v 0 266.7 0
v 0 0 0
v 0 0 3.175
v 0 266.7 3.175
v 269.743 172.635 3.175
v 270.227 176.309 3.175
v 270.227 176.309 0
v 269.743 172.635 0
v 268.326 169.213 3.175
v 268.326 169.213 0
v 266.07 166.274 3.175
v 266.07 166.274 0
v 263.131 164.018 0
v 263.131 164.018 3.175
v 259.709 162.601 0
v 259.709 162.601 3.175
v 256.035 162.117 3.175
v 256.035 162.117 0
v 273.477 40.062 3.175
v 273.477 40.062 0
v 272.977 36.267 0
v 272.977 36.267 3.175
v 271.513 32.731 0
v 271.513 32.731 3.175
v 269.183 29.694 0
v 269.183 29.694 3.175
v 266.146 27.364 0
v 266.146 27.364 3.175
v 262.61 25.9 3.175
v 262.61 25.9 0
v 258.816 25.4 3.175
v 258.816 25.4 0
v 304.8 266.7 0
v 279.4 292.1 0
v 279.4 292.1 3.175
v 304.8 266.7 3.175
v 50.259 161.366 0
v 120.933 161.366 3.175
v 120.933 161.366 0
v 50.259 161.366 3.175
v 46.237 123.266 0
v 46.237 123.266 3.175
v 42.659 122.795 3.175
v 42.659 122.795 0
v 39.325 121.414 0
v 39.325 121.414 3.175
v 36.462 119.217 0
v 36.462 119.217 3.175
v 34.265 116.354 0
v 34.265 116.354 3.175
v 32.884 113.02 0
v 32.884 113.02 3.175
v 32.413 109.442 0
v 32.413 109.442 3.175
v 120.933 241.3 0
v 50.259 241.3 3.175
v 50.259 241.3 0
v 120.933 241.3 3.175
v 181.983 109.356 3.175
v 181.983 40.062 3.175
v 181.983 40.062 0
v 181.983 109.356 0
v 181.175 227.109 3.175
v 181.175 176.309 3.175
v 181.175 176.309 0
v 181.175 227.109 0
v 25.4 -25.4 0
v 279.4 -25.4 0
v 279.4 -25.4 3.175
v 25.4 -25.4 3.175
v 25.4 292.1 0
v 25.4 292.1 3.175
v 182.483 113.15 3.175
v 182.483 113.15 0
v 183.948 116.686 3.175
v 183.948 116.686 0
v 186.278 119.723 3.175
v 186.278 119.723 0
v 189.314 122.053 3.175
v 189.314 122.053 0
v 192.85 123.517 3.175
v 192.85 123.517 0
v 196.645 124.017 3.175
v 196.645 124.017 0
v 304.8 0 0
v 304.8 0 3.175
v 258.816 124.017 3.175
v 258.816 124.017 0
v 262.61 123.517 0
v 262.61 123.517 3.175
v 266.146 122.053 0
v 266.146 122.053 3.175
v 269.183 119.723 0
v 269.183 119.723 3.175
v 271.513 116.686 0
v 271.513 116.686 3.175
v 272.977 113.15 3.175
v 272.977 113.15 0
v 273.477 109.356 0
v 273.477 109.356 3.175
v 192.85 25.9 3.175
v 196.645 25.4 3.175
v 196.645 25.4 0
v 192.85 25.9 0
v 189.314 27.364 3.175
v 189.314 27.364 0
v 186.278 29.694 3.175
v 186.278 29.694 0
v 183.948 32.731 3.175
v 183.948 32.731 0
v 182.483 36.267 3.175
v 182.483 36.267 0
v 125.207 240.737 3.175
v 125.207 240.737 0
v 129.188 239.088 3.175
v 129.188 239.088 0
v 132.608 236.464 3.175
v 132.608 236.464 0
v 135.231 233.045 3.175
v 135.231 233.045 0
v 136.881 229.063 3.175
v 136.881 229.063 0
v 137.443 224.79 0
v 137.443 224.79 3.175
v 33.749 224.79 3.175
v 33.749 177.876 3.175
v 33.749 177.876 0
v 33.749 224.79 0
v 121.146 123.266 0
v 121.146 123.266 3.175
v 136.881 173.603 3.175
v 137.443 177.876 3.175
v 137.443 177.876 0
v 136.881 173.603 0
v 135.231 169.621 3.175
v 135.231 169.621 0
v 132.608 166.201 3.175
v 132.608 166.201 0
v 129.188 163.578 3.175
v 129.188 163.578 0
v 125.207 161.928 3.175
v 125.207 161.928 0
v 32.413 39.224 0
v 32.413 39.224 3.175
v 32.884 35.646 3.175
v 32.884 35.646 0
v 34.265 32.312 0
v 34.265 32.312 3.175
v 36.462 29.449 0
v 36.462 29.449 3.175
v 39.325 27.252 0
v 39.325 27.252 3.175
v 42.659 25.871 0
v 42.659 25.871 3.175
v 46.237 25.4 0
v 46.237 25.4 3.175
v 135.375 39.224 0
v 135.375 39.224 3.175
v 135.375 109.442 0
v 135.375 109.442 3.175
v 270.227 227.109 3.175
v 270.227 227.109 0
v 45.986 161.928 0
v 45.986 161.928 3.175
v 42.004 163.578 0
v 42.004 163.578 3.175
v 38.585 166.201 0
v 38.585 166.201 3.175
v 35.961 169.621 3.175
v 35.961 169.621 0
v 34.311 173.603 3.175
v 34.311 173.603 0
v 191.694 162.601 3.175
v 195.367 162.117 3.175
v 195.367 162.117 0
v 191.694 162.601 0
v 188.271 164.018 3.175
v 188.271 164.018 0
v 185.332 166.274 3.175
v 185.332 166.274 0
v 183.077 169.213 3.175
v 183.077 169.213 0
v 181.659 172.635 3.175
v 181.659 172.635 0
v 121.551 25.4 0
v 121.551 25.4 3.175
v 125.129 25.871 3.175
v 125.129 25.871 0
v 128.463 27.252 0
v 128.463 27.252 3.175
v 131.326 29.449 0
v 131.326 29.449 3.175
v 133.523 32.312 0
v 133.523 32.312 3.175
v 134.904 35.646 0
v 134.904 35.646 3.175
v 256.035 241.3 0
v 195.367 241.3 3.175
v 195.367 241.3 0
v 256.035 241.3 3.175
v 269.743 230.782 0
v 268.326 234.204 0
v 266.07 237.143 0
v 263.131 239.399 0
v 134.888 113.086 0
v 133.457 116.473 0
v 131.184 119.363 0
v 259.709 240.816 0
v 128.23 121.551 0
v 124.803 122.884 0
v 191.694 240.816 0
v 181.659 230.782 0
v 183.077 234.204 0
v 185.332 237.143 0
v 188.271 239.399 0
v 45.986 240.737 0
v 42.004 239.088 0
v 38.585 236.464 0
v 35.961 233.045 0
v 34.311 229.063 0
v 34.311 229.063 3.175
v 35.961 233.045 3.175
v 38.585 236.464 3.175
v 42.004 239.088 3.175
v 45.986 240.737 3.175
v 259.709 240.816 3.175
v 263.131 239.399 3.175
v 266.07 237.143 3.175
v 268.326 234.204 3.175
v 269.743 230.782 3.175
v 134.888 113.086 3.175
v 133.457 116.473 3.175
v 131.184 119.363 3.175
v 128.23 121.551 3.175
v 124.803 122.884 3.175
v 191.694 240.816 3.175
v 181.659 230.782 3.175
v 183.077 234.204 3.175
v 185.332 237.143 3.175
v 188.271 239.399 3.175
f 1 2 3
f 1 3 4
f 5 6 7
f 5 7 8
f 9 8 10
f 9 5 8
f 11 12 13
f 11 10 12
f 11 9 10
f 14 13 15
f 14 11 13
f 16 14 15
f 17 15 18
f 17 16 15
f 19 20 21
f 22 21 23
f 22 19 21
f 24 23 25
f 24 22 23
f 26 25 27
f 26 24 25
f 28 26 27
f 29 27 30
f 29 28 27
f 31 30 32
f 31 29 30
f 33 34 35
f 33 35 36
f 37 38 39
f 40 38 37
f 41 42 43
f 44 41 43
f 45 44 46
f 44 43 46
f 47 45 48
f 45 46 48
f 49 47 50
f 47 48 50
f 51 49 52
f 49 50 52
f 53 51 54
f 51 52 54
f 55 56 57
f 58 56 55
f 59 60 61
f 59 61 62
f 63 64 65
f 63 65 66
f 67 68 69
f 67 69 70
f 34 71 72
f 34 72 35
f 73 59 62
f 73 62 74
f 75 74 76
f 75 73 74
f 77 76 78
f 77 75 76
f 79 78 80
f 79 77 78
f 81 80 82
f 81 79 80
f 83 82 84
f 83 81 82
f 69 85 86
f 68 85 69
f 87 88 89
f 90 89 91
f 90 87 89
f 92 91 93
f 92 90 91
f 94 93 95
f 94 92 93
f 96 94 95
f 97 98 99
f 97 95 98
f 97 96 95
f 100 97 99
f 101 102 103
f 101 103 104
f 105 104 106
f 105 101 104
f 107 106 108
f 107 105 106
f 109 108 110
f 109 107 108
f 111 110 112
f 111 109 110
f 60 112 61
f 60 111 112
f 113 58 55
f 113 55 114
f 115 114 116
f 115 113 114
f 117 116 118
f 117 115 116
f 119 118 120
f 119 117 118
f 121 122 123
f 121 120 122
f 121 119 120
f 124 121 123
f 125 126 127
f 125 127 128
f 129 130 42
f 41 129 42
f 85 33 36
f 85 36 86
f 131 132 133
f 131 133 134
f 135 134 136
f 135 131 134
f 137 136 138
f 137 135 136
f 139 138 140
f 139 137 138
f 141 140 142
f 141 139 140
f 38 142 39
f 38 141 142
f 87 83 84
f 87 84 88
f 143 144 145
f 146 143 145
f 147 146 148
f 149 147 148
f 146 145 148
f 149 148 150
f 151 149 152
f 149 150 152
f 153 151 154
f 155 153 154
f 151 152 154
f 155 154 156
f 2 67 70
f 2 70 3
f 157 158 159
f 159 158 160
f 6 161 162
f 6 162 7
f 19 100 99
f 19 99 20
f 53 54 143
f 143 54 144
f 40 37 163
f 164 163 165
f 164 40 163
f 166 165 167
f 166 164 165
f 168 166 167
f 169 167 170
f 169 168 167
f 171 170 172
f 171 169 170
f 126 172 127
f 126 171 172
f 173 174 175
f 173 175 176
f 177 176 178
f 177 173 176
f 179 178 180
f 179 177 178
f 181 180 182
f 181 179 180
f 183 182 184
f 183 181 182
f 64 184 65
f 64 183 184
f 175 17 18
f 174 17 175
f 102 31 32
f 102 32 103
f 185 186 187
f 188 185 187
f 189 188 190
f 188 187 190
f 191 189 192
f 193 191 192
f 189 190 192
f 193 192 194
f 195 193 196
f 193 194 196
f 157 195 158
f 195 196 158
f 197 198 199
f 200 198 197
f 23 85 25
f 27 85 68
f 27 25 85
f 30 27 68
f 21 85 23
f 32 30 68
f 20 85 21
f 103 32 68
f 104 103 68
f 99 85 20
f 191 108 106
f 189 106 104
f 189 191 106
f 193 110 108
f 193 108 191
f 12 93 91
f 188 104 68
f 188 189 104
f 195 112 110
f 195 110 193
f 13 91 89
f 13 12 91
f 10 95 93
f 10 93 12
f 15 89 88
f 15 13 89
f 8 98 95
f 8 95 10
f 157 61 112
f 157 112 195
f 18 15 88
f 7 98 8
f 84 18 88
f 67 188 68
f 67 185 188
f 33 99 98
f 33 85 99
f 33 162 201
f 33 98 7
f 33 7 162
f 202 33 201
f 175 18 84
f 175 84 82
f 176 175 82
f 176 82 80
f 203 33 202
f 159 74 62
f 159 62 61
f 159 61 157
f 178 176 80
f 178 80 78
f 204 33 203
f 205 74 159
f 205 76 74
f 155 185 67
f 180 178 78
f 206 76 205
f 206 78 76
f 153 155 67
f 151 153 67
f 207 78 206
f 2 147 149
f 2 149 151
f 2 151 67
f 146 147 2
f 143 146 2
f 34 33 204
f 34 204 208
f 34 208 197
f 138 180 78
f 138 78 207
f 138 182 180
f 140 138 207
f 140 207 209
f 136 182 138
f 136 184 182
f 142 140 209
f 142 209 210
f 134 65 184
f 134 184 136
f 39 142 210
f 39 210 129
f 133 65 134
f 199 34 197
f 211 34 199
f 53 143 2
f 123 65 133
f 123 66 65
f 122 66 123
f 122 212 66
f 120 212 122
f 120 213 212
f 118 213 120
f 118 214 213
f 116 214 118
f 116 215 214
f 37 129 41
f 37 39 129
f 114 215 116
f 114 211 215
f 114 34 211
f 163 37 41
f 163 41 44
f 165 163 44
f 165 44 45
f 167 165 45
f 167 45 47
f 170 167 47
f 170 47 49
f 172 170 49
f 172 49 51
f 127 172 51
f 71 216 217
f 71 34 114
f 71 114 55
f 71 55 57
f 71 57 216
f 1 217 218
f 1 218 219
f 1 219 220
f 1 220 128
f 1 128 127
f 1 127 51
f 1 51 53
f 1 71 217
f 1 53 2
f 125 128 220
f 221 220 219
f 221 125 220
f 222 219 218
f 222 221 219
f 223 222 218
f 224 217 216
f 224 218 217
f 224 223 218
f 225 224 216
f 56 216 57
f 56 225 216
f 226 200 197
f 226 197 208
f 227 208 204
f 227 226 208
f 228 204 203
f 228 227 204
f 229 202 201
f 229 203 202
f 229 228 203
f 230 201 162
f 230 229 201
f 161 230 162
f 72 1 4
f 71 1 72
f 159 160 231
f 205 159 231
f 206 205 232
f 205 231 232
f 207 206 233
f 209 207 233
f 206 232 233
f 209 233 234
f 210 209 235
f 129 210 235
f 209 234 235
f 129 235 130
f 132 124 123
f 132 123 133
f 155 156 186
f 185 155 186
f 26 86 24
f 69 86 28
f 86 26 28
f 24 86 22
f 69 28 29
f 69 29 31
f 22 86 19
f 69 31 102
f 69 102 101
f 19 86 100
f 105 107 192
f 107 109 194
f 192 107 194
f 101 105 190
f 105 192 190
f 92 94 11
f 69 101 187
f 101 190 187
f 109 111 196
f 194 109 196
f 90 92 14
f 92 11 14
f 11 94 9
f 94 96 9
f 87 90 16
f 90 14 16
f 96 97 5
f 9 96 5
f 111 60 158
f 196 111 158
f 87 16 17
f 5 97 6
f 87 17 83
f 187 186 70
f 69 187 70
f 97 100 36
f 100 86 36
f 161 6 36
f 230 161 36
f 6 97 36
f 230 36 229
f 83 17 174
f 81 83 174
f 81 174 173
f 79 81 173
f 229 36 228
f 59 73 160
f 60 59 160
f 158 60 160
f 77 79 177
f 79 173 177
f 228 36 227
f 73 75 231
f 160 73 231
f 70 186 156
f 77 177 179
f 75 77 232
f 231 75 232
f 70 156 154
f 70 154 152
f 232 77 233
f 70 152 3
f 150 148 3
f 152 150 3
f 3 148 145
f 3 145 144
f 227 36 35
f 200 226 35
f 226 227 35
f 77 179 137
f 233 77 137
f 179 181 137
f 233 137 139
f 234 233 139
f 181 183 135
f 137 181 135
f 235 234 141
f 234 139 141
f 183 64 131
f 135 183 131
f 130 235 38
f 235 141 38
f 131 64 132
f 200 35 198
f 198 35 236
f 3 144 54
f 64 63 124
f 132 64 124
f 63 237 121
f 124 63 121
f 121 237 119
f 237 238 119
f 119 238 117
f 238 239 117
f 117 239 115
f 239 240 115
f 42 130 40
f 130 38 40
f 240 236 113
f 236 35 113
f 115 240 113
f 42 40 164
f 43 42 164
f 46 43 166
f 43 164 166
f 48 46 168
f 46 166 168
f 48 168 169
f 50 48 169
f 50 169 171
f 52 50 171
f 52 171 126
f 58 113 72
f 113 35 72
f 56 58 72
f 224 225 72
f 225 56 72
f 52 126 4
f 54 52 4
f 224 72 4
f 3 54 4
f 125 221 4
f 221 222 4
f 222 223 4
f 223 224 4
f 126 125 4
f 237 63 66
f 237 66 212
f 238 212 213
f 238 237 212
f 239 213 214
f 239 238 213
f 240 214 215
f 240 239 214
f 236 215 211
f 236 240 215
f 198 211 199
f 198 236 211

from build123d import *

# Parameters (mm, degrees)
BOSS_EXTRUDE1_DEPTH = 3.175
CUT_EXTRUDE7_DEPTH  = 127


with BuildPart() as part:
    # Sketch1 → Boss-Extrude1 (new body)
    with BuildSketch(Plane.XY):
        Polygon((0, 266.7), (25.4, 292.1), (279.4, 292.1), (304.8, 266.7), (304.8, 0), (279.4, -25.4), (25.4, -25.4), (0, 0), align=None)
    extrude(amount=BOSS_EXTRUDE1_DEPTH)

    # Sketch4 → Cut-Extrude7 (cut)
    with BuildSketch(Plane.XY.offset(3.175)):
        with BuildLine():
            Line((50.258895016, 241.3), (120.933418015, 241.3))
            ThreePointArc((120.933418015, 241.3), (132.607750972, 236.464332957), (137.443418015, 224.79))
            Line((137.443418015, 224.79), (137.443418015, 177.875697945))
            ThreePointArc((137.443418015, 177.875697945), (132.607750972, 166.201364987), (120.933418015, 161.365697945))
            Line((120.933418015, 161.365697945), (50.258895016, 161.365697945))
            ThreePointArc((50.258895016, 161.365697945), (38.584562059, 166.201364987), (33.748895016, 177.875697945))
            Line((33.748895016, 177.875697945), (33.748895016, 224.79))
            ThreePointArc((33.748895016, 224.79), (38.584562059, 236.464332957), (50.258895016, 241.3))
        make_face()
        with BuildLine():
            Line((195.366803118, 241.3), (256.035491463, 241.3))
            ThreePointArc((256.035491463, 241.3), (266.070381863, 237.143412299), (270.226969564, 227.108521899))
            Line((270.226969564, 227.108521899), (270.226969564, 176.308521899))
            ThreePointArc((270.226969564, 176.308521899), (266.070381863, 166.273631498), (256.035491463, 162.117043797))
            Line((256.035491463, 162.117043797), (195.366803118, 162.117043797))
            ThreePointArc((195.366803118, 162.117043797), (185.331912718, 166.273631498), (181.175325017, 176.308521899))
            Line((181.175325017, 176.308521899), (181.175325017, 227.108521899))
            ThreePointArc((181.175325017, 227.108521899), (185.331912718, 237.143412299), (195.366803118, 241.3))
        make_face()
        with BuildLine():
            Line((121.145780521, 123.265697945), (46.236873468, 123.265697945))
            ThreePointArc((46.236873468, 123.265697945), (36.46177638, 119.216720157), (32.412798593, 109.44162307))
            Line((32.412798593, 109.44162307), (32.412798593, 39.224074875))
            ThreePointArc((32.412798593, 39.224074875), (36.46177638, 29.448977787), (46.236873468, 25.4))
            Line((46.236873468, 25.4), (121.551145478, 25.4))
            ThreePointArc((121.551145478, 25.4), (131.326242565, 29.448977787), (135.375220353, 39.224074875))
            Line((135.375220353, 39.224074875), (135.375220353, 109.44162307))
            ThreePointArc((135.375220353, 109.44162307), (131.183991006, 119.362876931), (121.145780521, 123.265697945))
        make_face()
        with BuildLine():
            Line((196.644821232, 124.017043797), (258.815551629, 124.017043797))
            ThreePointArc((258.815551629, 124.017043797), (269.182807745, 119.722785709), (273.477065833, 109.355529593))
            Line((273.477065833, 109.355529593), (273.477065833, 40.061514204))
            ThreePointArc((273.477065833, 40.061514204), (269.182807745, 29.694258088), (258.815551629, 25.4))
            Line((258.815551629, 25.4), (196.644821232, 25.4))
            ThreePointArc((196.644821232, 25.4), (186.277565116, 29.694258088), (181.983307028, 40.061514204))
            Line((181.983307028, 40.061514204), (181.983307028, 109.355529593))
            ThreePointArc((181.983307028, 109.355529593), (186.277565116, 119.722785709), (196.644821232, 124.017043797))
        make_face()
    extrude(amount=-CUT_EXTRUDE7_DEPTH, mode=Mode.SUBTRACT)


solid = part.part
